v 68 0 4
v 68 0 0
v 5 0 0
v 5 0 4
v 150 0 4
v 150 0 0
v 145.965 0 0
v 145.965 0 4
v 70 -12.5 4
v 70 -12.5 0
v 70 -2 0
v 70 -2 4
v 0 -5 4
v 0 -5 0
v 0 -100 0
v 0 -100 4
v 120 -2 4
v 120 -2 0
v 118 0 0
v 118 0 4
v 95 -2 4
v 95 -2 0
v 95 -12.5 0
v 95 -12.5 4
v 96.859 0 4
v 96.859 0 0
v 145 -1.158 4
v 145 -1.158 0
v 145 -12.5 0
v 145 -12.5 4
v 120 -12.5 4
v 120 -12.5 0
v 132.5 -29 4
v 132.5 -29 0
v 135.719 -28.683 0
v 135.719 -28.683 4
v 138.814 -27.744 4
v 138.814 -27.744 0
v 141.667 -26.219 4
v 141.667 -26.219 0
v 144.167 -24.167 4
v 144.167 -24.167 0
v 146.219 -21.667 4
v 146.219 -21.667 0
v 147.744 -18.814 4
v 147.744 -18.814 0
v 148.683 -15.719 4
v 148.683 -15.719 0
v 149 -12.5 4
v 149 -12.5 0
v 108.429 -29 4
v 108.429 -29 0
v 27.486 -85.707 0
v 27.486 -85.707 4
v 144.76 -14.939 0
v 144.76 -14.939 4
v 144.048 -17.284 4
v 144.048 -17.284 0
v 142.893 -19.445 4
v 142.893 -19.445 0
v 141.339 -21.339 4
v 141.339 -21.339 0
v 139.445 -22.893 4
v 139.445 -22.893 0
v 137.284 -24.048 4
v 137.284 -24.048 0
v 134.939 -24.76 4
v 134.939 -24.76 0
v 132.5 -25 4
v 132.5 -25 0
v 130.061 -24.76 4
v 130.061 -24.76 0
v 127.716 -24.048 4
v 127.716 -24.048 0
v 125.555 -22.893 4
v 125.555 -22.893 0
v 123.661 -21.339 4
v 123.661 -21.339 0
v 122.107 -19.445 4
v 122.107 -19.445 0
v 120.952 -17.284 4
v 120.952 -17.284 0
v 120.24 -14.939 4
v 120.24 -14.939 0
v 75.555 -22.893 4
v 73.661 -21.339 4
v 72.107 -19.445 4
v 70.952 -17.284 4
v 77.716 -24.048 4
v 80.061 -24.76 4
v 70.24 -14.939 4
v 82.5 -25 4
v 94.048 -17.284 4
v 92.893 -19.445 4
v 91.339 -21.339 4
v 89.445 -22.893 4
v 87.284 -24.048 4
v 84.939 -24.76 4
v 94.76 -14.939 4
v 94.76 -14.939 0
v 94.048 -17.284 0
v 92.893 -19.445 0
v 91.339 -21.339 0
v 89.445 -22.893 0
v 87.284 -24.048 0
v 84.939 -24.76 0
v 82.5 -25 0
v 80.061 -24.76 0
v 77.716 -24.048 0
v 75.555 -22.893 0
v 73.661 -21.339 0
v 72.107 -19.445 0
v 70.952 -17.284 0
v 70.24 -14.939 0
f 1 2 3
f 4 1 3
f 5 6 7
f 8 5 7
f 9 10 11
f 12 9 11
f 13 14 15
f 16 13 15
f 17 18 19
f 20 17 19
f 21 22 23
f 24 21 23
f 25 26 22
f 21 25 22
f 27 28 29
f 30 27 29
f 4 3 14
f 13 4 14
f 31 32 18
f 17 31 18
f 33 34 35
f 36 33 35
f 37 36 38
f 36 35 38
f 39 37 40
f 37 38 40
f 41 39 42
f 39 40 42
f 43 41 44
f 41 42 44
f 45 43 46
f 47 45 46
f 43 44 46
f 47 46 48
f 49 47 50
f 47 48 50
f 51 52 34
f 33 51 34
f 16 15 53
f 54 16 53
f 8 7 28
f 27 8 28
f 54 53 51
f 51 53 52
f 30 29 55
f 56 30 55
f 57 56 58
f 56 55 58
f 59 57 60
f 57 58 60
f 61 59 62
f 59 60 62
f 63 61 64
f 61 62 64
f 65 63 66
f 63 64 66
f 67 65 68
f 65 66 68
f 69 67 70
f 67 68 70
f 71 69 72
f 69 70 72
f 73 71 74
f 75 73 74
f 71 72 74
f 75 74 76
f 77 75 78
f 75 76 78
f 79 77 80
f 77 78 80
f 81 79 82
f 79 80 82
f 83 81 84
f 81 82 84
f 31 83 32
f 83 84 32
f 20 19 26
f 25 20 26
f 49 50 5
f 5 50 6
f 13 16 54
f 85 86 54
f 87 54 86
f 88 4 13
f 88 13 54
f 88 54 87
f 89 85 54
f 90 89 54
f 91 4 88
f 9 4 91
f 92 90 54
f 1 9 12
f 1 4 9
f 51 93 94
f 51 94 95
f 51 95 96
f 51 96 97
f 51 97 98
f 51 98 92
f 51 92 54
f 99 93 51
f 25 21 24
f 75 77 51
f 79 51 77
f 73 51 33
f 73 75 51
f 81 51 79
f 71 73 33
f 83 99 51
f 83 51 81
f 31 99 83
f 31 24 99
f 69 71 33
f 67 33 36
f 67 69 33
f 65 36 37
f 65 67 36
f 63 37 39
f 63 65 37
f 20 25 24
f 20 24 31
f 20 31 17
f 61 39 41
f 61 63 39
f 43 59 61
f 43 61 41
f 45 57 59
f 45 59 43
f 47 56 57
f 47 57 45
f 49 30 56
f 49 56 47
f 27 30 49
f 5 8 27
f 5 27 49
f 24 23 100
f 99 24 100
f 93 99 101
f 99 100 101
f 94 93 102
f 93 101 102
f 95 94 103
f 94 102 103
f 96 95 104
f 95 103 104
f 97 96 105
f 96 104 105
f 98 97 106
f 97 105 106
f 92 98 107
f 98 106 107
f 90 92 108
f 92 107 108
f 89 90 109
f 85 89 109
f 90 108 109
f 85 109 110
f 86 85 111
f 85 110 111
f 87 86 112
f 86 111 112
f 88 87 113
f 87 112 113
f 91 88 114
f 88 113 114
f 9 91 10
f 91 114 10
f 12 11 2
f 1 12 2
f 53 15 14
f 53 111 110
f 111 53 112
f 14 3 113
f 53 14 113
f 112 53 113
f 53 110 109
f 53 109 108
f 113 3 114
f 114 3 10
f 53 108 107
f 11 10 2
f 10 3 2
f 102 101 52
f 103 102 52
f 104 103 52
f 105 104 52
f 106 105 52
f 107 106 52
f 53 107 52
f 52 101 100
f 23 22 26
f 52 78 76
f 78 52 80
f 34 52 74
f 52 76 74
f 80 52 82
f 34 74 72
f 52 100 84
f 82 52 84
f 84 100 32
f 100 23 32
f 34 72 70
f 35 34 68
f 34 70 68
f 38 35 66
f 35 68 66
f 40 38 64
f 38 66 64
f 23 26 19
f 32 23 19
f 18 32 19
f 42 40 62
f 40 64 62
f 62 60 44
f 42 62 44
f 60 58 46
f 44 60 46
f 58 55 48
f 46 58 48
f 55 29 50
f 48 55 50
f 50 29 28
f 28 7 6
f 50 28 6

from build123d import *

# Parameters (mm, degrees)
F1_DEPTH = 4


with BuildPart() as f1:
    # F0 (on Top) → F1 (new body)
    with BuildSketch(Plane.XY):
        with BuildLine():
            Line((5, 0), (0, -5))
            Line((0, -5), (0, -100))
            Line((0, -100), (27.486404, -85.706576))
            Line((27.486404, -85.706576), (108.429266, -29))
            Line((108.429266, -29), (132.5, -29))
            ThreePointArc((132.5, -29), (144.167262, -24.167262), (149, -12.5))
            Line((149, -12.5), (150, 0))
            Line((150, 0), (145.965368, 0))
            Line((145.965368, 0), (145, -1.158226))
            Line((145, -1.158226), (145, -3.333333))
            Line((145, -3.333333), (145, -12.5))
            ThreePointArc((145, -12.5), (132.5, -25), (120, -12.5))
            Line((120, -12.5), (120, -2))
            Line((120, -2), (118, 0))
            Line((118, 0), (96.858531, 0))
            Line((96.858531, 0), (95, -2))
            Line((95, -2), (95, -12.5))
            ThreePointArc((95, -12.5), (82.5, -25), (70, -12.5))
            Line((70, -12.5), (70, -2))
            Line((70, -2), (68, 0))
            Line((68, 0), (5, 0))
        make_face()
    extrude(amount=F1_DEPTH)


solid = f1.part
